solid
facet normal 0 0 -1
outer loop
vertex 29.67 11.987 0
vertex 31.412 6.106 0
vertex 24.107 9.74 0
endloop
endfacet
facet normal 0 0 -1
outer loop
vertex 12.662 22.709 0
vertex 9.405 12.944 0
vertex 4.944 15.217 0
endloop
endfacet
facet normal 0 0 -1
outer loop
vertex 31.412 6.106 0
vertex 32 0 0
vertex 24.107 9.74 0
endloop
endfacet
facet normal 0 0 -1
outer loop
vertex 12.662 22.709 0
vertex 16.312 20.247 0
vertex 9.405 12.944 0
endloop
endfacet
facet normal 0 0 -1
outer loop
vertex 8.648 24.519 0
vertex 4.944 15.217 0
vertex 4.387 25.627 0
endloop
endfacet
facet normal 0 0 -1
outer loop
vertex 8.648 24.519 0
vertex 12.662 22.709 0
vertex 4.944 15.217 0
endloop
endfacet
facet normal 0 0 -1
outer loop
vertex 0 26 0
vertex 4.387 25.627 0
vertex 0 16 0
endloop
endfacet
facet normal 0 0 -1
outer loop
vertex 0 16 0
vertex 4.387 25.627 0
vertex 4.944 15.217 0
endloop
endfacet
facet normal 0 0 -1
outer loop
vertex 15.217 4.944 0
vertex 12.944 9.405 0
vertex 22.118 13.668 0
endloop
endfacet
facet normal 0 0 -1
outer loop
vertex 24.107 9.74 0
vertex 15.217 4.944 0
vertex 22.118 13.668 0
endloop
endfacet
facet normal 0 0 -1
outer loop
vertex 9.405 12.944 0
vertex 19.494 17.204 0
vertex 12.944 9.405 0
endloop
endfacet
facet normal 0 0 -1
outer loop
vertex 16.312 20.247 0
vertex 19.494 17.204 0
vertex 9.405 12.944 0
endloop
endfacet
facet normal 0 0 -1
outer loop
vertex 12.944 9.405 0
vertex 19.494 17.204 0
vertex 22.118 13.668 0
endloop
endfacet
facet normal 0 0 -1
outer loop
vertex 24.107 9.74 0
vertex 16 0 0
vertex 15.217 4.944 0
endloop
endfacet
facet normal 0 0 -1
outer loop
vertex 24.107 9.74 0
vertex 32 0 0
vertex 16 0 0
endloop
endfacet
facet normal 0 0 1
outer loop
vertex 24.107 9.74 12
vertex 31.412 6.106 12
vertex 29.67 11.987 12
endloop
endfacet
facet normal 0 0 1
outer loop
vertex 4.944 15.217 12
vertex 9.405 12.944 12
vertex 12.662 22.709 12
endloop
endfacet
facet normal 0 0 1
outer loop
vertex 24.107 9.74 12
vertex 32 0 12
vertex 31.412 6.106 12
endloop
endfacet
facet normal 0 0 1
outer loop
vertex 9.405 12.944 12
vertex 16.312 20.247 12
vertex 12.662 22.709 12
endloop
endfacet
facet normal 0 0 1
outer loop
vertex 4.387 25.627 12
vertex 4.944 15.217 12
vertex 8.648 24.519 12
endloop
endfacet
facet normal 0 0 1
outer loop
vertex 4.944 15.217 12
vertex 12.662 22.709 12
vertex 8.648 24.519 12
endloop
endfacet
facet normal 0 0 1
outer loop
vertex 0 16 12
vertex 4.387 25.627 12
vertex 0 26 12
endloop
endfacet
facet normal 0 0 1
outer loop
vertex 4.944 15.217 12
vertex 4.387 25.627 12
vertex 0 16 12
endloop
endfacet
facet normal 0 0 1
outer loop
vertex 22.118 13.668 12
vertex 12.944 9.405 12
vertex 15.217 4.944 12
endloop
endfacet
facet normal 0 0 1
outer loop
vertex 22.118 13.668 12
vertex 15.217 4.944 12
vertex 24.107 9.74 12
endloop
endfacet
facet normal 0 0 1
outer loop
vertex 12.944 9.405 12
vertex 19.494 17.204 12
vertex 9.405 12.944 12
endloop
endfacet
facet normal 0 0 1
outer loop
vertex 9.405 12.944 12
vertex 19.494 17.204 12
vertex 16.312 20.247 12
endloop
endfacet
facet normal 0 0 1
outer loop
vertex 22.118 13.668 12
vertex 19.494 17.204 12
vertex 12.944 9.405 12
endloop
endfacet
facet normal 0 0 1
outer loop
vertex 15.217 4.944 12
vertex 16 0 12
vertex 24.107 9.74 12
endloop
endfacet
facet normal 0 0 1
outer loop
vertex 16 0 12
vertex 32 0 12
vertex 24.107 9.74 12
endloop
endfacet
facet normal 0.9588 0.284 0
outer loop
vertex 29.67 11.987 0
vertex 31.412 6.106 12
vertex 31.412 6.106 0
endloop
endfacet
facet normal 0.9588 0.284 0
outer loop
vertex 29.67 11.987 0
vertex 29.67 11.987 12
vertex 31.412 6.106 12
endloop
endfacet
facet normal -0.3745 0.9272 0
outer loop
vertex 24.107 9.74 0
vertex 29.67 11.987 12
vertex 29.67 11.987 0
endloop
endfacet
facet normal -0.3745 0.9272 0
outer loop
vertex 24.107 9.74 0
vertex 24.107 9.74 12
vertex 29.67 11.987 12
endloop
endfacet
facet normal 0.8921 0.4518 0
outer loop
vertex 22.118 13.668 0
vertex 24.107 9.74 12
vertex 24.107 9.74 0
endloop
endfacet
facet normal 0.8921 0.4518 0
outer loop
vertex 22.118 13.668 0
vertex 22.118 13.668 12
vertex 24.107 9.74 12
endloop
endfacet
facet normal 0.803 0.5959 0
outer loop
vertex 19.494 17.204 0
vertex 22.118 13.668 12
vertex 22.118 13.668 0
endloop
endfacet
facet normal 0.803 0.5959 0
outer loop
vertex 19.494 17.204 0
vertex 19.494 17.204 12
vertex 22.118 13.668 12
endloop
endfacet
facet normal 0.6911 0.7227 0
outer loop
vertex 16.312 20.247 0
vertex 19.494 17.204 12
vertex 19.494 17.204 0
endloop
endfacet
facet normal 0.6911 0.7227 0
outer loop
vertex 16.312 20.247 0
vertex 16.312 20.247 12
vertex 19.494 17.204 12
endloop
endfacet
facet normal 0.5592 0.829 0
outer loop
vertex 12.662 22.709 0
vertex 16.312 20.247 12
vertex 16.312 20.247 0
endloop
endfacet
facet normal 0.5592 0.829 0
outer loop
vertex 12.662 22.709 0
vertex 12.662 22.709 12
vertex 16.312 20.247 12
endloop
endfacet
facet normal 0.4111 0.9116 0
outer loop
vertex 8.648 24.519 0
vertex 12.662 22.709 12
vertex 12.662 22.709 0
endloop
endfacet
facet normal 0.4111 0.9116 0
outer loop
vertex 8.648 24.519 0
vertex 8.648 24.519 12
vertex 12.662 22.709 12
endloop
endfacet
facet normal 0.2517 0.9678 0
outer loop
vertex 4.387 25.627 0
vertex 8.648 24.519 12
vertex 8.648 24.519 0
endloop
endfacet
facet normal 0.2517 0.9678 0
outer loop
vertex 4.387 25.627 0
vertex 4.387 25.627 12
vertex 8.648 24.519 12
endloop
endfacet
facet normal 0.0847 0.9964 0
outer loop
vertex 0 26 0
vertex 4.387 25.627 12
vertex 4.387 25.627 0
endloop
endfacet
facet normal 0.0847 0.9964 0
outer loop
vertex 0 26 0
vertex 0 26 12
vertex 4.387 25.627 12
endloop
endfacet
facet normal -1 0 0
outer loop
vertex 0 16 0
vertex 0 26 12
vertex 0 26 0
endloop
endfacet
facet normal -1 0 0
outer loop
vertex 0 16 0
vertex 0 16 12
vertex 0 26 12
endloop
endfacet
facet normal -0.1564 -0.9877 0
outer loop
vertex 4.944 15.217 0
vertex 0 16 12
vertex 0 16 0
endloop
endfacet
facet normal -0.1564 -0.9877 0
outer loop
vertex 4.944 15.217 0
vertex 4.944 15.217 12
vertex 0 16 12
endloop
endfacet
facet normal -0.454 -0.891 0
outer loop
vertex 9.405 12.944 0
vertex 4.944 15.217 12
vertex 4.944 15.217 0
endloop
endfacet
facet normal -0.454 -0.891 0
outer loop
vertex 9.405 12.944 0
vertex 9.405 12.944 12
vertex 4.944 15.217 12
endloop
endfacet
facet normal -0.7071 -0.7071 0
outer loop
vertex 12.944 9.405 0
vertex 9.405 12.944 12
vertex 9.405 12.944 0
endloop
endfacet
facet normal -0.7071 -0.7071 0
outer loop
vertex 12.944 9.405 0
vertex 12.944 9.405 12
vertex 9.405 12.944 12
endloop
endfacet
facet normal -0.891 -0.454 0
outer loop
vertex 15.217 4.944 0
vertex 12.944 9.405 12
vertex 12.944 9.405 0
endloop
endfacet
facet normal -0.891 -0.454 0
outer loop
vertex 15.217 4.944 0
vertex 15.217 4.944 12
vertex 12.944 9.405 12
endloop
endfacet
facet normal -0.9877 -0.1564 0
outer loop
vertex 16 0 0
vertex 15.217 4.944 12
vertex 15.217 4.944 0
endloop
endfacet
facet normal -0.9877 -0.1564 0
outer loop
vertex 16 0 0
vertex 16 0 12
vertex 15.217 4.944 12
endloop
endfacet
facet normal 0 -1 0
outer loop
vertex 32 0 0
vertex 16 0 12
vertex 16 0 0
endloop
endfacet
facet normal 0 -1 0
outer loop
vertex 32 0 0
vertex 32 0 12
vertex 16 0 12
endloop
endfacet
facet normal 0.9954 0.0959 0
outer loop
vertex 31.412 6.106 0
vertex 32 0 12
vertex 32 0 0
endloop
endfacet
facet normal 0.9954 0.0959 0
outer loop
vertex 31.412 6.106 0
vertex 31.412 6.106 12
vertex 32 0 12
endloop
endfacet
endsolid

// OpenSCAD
$fn = 32;

// ----------------------------------------------------------------------
// Arc stop: segment, 12 mm thick
// ----------------------------------------------------------------------

// --- parameters (mm) ---
profile_height = 12;      // extrusion height
profile_points = 17;      // points of the closed outline

profile = [[32, 0], [31.412, 6.106], [29.67, 11.987], [24.107, 9.74], [22.118, 13.668], [19.494, 17.204], [16.312, 20.247], [12.662, 22.709], [8.648, 24.519], [4.387, 25.627], [0, 26], [0, 16], [4.944, 15.217], [9.405, 12.944], [12.944, 9.405], [15.217, 4.944], [16, 0]];  // single closed polygon, 17 points, counter clockwise

// --- the one profile operation ---
linear_extrude(height = profile_height) polygon(points = profile);
